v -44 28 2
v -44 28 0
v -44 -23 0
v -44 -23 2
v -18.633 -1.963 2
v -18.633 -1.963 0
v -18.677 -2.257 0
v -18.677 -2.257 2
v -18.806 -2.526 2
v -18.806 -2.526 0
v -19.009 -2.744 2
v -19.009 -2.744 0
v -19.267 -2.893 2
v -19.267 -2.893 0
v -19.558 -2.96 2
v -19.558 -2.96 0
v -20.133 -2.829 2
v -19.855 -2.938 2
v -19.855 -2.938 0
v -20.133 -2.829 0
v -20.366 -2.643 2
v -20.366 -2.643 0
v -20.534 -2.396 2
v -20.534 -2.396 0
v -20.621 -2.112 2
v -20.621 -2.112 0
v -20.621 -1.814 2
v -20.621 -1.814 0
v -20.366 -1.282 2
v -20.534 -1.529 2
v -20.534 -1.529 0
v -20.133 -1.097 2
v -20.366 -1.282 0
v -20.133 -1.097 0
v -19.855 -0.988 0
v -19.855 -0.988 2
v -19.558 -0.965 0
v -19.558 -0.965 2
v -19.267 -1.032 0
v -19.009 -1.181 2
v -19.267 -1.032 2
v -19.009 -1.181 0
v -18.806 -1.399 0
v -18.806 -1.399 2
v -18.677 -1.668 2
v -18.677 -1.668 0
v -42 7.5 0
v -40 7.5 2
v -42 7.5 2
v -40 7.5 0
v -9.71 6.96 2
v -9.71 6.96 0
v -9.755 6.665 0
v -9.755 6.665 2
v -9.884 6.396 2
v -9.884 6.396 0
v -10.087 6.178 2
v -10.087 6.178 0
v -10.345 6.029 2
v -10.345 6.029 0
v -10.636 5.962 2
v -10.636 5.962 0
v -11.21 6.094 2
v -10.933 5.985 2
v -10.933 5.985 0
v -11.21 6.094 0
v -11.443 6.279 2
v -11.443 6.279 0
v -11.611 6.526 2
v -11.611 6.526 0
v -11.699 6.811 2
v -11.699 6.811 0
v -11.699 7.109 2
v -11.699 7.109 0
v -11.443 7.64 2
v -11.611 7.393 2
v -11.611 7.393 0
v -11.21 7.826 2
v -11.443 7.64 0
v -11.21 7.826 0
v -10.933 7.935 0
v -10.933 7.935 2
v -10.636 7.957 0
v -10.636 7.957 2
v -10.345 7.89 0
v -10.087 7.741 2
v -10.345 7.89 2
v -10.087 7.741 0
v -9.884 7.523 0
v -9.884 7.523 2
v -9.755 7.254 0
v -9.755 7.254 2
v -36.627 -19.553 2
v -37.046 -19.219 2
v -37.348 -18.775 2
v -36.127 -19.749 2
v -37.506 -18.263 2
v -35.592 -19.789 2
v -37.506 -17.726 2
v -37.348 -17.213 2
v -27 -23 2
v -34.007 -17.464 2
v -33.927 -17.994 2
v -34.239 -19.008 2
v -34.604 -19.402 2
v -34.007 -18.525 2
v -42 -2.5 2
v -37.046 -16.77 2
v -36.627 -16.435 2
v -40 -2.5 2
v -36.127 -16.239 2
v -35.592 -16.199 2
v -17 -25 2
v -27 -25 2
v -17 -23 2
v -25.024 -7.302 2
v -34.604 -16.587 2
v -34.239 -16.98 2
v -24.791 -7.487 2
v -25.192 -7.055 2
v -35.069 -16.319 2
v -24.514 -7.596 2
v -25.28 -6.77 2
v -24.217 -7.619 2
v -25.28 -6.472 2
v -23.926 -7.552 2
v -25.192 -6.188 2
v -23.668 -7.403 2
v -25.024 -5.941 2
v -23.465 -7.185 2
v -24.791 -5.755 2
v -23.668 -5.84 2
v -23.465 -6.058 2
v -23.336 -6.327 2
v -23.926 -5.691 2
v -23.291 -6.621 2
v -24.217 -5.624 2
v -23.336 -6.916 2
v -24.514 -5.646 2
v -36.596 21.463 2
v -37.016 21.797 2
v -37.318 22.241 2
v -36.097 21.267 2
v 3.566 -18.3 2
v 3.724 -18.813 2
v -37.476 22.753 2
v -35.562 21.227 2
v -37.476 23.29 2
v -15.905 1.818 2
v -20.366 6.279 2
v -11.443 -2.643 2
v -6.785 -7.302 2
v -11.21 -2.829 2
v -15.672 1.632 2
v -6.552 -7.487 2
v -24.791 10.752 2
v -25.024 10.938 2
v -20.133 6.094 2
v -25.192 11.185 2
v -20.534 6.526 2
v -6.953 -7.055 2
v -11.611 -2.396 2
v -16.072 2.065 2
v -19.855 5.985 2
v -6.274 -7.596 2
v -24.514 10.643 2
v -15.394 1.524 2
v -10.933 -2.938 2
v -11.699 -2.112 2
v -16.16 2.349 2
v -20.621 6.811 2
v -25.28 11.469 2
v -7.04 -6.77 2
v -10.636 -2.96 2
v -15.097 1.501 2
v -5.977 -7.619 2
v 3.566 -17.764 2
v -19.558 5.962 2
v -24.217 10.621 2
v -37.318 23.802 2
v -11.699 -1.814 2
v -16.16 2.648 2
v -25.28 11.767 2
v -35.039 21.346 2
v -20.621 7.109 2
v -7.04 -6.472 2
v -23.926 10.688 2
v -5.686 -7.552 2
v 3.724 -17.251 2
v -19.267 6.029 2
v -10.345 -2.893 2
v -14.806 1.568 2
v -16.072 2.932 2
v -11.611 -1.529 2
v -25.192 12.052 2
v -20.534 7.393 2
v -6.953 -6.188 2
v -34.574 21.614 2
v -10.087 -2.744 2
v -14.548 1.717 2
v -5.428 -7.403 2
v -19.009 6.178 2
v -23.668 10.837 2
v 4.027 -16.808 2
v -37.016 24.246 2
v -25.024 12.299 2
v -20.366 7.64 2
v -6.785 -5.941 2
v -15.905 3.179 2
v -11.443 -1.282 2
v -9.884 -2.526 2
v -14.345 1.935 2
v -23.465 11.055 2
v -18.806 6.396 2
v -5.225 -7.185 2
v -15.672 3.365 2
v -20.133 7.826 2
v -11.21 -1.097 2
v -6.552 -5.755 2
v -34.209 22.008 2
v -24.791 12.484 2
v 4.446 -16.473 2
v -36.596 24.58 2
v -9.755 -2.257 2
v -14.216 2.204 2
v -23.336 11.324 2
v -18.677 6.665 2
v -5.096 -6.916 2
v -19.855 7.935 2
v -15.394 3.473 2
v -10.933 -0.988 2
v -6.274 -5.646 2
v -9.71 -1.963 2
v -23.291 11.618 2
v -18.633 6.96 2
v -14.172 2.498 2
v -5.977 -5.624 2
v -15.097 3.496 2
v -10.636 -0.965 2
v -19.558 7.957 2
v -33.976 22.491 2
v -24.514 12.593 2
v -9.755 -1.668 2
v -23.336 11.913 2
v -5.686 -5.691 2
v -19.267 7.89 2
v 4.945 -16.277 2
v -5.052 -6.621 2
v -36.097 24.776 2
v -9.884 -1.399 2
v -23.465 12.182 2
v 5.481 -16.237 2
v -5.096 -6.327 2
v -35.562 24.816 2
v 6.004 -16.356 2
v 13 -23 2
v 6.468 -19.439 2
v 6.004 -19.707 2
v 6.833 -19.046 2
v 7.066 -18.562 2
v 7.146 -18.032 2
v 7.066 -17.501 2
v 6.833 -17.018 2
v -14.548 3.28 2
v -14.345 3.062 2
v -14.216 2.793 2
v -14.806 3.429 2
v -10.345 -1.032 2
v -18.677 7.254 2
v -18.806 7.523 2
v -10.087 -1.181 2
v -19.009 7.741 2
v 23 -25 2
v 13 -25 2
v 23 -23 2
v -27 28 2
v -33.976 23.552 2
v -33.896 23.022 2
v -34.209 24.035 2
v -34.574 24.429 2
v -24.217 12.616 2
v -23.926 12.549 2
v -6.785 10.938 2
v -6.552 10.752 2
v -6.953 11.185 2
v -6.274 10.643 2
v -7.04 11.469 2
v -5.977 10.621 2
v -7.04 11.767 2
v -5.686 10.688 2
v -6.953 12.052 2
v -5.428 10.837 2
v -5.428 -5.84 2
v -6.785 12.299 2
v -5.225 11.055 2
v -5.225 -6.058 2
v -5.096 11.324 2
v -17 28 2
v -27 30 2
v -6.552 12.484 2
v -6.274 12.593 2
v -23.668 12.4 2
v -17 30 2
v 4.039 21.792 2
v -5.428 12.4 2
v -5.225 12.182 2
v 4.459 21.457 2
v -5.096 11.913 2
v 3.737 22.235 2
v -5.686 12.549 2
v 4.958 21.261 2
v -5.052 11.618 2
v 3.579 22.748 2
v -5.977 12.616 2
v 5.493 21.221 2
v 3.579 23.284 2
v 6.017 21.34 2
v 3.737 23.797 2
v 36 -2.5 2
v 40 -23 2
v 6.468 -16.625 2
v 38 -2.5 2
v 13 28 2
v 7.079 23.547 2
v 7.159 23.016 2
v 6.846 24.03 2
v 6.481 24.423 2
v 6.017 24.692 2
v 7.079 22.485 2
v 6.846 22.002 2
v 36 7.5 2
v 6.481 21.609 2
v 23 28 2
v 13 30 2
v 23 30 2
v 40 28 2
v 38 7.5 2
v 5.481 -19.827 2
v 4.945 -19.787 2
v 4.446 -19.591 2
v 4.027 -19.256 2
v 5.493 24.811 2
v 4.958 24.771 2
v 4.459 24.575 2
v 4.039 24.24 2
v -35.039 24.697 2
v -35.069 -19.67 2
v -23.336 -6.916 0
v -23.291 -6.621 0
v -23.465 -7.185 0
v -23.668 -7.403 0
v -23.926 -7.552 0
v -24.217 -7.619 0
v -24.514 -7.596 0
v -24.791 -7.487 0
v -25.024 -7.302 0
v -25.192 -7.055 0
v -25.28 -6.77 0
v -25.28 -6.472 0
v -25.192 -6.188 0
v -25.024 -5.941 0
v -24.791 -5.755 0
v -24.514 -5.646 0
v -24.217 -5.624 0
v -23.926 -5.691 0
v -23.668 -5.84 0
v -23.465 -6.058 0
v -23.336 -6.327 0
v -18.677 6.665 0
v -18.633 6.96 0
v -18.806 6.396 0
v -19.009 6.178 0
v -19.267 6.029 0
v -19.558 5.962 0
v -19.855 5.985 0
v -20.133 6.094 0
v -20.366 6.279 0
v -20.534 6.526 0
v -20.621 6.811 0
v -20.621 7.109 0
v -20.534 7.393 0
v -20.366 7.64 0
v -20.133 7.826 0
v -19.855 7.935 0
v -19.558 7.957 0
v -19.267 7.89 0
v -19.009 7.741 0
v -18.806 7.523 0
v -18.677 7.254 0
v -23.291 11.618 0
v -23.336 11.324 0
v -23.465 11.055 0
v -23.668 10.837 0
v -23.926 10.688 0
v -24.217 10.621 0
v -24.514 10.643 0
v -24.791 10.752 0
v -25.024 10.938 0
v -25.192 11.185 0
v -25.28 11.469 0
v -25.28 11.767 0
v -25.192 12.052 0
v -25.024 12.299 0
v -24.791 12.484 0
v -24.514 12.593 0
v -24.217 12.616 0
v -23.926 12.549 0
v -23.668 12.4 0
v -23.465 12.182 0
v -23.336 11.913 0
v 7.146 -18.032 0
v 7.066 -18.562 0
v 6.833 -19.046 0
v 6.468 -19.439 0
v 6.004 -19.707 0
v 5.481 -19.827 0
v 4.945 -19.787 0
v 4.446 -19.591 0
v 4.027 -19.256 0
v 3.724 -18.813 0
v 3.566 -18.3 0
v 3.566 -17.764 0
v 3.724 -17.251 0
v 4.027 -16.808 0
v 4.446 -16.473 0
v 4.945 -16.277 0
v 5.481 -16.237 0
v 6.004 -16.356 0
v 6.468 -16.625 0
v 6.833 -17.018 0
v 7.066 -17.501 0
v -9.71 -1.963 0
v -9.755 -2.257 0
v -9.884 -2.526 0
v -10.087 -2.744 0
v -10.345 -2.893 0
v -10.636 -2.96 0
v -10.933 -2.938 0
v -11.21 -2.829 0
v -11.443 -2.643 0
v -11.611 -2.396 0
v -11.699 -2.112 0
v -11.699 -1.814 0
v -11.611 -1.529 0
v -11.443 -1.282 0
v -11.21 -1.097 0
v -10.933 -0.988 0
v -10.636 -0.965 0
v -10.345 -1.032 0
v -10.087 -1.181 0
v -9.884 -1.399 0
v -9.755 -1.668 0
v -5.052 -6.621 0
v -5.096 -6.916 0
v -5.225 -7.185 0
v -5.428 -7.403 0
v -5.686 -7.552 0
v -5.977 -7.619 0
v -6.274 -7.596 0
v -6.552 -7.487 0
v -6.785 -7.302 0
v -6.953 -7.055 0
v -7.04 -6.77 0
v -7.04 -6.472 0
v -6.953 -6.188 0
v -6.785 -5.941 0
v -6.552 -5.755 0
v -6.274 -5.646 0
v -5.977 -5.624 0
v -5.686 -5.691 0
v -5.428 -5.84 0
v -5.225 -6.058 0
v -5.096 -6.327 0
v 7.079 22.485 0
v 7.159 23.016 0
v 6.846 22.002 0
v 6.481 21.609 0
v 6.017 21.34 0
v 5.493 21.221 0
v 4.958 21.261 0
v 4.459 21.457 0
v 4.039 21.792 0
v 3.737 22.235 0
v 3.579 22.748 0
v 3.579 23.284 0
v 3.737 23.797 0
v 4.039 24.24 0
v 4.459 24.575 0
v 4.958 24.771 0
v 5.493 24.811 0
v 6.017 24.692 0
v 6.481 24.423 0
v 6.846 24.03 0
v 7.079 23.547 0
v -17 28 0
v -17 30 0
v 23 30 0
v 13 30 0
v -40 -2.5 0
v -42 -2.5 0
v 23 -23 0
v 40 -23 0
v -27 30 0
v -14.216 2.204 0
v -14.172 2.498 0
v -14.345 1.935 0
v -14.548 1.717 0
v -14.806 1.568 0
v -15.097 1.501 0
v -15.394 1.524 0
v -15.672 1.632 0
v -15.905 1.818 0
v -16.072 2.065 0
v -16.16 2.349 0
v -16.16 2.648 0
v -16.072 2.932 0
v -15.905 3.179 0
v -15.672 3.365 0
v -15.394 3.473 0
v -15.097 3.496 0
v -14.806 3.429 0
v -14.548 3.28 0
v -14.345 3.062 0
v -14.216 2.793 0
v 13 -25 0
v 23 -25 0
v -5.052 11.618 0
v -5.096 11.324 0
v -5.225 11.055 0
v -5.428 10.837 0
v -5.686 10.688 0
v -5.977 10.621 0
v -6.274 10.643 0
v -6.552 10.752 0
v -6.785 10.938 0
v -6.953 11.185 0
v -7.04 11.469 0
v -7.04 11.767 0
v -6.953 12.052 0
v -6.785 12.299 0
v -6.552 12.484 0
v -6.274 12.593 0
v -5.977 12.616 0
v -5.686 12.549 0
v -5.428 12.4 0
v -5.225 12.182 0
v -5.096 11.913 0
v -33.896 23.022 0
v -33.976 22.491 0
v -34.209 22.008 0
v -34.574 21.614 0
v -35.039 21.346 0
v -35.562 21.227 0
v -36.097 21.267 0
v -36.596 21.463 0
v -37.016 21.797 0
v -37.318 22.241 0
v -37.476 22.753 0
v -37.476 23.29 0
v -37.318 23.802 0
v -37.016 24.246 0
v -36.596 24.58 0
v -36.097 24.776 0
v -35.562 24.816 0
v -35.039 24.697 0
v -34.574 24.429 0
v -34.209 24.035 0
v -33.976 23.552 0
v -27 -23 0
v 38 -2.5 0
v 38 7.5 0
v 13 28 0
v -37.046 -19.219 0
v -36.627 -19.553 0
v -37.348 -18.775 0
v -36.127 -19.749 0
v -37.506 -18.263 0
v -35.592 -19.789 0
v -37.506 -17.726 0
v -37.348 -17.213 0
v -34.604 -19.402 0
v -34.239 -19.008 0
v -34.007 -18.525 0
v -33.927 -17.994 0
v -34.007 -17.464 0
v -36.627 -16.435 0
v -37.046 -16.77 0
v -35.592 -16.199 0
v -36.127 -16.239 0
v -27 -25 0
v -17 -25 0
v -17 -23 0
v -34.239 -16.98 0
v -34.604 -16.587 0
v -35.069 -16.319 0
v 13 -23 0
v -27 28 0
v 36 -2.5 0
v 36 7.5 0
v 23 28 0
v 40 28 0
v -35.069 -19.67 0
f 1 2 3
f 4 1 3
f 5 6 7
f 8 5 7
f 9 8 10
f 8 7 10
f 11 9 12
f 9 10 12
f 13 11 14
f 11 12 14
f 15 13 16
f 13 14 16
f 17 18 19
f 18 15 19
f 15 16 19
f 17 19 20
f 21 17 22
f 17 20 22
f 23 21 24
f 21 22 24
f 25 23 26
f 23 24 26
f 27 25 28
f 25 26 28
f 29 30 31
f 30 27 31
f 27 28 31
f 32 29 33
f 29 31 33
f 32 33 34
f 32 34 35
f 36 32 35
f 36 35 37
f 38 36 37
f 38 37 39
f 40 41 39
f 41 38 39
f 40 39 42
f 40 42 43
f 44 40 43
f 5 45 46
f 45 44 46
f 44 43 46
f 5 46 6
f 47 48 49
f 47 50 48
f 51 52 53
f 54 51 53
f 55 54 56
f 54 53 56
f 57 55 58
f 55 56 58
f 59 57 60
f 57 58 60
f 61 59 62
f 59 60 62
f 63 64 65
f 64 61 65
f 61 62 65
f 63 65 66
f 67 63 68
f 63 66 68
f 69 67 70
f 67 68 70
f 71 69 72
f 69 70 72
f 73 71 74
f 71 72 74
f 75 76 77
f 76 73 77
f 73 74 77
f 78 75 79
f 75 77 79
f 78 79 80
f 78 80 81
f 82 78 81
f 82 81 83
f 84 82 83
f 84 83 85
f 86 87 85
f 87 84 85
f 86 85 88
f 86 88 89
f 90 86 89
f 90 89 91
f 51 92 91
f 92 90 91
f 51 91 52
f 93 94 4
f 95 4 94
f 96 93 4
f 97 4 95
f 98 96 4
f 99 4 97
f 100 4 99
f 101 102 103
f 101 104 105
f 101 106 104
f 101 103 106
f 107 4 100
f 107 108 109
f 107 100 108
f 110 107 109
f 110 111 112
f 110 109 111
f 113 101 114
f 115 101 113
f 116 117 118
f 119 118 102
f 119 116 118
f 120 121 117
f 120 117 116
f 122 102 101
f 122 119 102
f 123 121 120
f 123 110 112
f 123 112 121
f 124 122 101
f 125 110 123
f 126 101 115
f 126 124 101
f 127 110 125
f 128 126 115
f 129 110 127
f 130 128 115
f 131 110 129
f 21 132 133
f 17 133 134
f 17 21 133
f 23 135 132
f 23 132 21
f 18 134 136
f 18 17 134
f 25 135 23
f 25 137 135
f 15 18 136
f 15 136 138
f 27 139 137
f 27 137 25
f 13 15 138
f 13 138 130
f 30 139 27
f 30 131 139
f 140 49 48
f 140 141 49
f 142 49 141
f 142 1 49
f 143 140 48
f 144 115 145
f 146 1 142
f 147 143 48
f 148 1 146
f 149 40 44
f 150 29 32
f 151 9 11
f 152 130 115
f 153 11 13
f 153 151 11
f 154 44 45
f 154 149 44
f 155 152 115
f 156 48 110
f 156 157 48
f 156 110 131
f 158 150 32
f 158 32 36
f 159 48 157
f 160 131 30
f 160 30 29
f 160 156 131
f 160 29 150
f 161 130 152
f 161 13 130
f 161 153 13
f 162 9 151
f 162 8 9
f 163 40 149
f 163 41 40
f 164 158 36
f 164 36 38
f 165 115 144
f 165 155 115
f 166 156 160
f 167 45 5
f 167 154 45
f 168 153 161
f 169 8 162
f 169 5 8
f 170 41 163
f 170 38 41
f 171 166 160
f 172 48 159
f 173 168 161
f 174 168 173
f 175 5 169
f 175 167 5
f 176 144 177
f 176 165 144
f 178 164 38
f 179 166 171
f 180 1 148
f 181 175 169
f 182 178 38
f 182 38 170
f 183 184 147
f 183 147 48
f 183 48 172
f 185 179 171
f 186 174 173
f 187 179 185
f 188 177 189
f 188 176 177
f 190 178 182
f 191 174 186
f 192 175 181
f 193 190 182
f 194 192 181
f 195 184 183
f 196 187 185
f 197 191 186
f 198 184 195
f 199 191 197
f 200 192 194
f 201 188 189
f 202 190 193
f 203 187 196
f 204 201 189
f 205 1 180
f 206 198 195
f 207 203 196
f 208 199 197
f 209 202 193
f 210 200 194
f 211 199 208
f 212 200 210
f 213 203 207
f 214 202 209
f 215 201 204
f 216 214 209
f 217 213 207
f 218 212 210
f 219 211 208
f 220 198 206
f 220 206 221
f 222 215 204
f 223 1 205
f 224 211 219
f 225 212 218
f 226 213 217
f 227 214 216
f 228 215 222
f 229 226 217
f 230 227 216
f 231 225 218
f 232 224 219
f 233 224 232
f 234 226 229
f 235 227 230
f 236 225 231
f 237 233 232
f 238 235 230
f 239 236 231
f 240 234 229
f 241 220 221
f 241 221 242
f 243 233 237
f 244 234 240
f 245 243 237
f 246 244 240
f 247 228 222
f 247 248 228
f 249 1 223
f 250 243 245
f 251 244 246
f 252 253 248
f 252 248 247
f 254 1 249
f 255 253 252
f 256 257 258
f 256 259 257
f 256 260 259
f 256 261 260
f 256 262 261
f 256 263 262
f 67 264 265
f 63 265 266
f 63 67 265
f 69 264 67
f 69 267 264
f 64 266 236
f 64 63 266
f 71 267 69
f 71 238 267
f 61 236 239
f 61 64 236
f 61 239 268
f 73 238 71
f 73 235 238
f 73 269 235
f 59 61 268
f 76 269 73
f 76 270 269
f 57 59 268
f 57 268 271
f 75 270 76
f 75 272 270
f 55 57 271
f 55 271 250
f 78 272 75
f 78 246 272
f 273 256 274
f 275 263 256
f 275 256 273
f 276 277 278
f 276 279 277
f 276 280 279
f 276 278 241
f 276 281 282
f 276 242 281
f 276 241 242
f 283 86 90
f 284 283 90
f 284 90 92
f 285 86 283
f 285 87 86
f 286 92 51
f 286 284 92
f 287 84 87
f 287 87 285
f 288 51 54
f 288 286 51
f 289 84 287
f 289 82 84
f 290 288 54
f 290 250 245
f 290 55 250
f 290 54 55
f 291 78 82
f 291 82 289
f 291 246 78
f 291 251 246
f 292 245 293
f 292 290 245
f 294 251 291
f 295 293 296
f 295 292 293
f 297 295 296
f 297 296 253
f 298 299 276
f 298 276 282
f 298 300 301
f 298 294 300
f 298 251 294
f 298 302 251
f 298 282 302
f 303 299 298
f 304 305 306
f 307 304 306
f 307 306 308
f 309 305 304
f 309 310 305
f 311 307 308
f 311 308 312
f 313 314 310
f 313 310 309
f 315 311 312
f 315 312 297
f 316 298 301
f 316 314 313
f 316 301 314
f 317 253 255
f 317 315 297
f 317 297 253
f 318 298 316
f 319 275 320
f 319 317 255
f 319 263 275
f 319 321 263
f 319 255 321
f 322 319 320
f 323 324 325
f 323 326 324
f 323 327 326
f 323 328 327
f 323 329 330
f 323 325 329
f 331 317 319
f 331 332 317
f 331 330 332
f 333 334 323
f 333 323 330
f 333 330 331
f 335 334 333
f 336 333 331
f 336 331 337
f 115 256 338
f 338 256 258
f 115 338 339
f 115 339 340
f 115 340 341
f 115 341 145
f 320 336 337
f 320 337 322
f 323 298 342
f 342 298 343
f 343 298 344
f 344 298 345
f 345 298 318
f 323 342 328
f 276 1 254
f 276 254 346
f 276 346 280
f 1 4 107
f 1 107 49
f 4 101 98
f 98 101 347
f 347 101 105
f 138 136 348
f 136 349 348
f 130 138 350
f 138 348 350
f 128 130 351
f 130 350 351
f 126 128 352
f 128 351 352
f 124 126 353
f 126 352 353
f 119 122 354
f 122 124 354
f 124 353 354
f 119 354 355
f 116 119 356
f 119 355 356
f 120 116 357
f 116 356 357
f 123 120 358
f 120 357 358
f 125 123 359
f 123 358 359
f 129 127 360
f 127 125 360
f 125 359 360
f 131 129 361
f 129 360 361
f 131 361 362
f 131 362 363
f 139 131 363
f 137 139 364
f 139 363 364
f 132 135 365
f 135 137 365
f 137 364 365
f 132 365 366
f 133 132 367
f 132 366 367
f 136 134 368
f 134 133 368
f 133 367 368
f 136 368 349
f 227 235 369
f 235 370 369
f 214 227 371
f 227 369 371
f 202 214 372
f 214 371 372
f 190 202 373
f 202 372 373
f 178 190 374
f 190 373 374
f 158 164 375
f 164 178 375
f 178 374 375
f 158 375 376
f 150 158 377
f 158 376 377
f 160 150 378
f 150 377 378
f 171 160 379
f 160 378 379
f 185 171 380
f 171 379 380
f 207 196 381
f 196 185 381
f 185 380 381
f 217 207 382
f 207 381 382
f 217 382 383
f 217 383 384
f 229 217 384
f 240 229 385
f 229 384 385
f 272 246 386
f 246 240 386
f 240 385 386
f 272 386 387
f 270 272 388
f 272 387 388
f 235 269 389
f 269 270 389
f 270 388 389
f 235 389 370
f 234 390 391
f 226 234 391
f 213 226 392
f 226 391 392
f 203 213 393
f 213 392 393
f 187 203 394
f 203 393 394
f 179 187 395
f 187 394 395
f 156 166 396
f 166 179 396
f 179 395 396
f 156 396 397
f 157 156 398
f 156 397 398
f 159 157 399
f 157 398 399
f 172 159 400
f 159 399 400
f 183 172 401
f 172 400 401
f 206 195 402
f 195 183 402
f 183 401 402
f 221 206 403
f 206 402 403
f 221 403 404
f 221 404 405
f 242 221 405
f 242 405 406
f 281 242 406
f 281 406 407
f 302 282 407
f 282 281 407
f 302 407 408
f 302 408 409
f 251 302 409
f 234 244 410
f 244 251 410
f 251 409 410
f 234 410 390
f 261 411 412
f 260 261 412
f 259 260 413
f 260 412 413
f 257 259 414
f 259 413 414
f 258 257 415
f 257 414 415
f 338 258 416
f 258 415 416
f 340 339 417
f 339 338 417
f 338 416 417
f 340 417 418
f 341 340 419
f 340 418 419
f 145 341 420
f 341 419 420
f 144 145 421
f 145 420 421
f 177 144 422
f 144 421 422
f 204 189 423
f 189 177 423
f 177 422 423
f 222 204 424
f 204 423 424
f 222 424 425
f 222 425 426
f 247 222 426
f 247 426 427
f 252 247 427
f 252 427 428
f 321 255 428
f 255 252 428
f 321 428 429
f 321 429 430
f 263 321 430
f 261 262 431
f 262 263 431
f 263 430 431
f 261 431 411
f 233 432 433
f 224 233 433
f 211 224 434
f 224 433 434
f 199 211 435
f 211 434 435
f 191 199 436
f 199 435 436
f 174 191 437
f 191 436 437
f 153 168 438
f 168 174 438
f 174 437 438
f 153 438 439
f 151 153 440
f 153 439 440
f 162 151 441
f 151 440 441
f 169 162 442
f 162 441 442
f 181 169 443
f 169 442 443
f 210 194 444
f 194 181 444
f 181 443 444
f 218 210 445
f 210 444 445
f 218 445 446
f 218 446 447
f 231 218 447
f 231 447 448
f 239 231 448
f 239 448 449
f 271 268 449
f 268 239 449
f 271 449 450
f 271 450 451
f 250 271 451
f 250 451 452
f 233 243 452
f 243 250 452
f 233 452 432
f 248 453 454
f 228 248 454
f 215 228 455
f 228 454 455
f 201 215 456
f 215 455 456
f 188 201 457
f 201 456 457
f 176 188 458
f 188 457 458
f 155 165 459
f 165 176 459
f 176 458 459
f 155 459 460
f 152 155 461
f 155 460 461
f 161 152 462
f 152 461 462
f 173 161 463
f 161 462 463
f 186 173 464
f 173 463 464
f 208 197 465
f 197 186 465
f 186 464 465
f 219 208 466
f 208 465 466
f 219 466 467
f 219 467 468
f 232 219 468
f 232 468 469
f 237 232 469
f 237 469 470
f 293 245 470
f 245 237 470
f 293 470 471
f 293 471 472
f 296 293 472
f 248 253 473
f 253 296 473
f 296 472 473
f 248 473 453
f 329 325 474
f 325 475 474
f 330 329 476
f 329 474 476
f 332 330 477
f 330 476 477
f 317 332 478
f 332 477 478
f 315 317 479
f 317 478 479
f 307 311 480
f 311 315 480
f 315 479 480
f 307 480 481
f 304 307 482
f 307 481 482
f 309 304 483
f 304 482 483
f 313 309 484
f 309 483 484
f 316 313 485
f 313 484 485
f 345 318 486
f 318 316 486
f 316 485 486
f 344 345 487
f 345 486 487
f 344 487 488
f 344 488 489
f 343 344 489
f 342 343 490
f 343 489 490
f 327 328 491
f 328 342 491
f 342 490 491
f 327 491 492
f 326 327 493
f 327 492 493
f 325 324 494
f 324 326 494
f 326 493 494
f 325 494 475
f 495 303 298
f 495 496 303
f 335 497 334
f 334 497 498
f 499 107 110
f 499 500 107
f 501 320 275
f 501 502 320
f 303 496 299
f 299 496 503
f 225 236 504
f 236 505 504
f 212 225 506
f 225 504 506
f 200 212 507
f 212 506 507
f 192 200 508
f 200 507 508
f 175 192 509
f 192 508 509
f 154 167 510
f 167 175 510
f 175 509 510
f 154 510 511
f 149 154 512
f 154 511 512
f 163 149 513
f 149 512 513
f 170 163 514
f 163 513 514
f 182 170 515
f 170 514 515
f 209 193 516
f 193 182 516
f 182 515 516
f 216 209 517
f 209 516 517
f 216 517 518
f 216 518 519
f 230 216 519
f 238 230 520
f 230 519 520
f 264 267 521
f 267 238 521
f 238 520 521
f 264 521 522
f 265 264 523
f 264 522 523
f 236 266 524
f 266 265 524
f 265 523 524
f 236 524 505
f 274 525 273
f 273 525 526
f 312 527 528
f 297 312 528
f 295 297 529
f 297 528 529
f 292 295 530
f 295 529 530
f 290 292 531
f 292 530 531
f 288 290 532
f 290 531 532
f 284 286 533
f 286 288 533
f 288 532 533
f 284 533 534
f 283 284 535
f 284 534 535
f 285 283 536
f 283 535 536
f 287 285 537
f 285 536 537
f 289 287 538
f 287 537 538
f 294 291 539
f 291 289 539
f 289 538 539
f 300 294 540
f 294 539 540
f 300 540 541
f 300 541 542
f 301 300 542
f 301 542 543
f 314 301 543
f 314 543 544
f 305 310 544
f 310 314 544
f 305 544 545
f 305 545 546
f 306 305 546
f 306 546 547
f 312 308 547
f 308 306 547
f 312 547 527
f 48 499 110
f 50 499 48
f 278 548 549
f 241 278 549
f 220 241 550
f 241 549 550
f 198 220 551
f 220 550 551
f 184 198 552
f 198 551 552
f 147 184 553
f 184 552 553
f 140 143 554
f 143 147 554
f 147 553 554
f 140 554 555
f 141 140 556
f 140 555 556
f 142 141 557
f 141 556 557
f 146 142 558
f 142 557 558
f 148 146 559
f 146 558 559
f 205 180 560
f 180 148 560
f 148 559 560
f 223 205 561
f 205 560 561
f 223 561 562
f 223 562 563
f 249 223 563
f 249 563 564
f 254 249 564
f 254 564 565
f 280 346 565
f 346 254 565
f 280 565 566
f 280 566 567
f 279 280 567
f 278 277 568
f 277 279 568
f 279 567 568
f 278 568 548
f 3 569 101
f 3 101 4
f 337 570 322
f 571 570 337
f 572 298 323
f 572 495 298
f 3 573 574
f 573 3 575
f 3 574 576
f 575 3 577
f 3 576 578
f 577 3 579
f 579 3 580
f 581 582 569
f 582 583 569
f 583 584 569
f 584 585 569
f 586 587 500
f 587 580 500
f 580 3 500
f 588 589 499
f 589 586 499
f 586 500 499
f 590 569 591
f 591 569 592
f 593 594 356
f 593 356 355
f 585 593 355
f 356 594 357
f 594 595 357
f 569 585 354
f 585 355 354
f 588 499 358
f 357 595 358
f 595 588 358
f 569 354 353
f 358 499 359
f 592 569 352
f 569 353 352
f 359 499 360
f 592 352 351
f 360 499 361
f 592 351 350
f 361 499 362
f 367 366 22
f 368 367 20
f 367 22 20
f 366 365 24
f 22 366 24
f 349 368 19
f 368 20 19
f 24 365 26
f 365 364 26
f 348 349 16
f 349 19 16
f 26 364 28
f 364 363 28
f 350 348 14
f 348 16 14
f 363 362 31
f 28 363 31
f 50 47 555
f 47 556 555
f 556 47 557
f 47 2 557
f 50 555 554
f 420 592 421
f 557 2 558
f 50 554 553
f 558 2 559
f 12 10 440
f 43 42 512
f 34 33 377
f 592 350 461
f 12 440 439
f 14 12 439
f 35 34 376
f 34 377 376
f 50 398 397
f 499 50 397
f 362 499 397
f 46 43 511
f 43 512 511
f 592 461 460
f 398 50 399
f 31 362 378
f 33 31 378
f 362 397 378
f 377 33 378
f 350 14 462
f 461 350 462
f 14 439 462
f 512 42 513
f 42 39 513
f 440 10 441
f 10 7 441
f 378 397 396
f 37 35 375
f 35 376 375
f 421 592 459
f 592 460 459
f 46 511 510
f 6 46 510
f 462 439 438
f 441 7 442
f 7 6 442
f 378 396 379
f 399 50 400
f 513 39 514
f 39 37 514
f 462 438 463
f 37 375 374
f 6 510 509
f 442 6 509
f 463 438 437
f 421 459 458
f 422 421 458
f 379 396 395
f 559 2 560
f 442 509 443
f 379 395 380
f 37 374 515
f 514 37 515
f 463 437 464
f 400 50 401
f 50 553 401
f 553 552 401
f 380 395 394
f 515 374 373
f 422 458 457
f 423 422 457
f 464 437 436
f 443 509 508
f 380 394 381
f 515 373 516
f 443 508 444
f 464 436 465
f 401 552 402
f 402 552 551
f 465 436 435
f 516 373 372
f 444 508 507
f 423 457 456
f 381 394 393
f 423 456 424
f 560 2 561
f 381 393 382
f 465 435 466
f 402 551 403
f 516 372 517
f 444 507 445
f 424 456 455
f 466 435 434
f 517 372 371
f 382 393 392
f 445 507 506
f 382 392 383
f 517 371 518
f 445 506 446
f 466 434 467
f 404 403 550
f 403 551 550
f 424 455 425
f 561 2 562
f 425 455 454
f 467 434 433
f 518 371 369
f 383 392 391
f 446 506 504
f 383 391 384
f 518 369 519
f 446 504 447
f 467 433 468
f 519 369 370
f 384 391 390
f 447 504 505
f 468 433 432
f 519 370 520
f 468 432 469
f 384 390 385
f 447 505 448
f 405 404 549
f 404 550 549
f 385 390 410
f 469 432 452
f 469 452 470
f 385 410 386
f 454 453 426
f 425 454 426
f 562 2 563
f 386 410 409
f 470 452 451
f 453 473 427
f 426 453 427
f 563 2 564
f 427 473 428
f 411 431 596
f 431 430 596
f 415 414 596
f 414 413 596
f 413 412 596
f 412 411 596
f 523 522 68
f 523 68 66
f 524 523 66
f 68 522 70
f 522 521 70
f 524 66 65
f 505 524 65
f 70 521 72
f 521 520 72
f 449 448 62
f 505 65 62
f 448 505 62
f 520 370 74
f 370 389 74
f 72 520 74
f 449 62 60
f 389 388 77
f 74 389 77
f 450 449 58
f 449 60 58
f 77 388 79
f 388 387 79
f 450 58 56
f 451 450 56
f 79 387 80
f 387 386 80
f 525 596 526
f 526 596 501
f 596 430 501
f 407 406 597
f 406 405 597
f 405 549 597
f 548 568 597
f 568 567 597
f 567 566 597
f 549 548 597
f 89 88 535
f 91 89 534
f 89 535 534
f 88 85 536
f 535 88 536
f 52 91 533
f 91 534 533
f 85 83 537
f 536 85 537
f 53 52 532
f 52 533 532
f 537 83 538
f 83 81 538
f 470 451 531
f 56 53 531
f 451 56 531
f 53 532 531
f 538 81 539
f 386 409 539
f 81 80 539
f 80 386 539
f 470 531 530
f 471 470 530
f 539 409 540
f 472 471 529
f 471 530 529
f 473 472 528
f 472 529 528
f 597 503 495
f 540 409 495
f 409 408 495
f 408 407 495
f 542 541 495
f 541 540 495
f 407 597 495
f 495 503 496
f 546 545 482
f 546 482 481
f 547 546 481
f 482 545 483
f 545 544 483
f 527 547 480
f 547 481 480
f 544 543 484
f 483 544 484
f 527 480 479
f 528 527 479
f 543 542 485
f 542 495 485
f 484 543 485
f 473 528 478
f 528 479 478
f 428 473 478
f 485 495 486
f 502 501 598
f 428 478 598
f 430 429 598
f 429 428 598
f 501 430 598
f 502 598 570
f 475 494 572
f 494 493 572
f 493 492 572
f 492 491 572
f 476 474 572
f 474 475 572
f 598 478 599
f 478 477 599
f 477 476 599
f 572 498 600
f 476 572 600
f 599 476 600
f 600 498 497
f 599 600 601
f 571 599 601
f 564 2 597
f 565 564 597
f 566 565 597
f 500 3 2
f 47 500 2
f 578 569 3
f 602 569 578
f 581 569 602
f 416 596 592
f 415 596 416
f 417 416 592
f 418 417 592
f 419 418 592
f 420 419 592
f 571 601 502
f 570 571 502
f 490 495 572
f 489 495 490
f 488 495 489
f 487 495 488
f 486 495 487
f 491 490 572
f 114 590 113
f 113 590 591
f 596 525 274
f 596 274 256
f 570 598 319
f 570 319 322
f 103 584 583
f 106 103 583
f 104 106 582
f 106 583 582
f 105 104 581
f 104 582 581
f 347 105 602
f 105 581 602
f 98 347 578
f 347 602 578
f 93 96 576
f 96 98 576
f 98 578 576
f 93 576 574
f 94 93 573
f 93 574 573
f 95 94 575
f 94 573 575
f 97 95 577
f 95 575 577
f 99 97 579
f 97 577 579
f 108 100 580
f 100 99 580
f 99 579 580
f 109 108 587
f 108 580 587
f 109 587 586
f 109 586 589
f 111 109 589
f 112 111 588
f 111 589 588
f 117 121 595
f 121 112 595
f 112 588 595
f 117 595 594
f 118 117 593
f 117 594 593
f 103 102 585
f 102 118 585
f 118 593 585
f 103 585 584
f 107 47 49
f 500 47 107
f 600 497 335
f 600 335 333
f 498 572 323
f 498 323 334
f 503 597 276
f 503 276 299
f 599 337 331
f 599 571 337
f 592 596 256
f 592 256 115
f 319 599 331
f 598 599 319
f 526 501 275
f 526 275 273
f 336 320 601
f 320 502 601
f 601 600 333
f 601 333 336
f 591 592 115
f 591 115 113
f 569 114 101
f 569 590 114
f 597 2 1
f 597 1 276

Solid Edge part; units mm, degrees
sketch "Sketch1" plane through (0, 0, 0) normal (0, 0, 1) x (1, 0, 0)
  line L0 (40, -25) -> (40, 30)
  line L1 (40, 30) -> (-44, 30)
  line L2 (-44, 30) -> (-44, -25)
  line L3 (-44, -25) -> (40, -25)
extrude "Protrusion1" add sketch "Sketch1" along normal blind 2
sketch "Sketch2" plane through (0, 0, 0) normal (0, 0, 1) x (1, 0, 0)
  line L0 (-44, 28) -> (-27, 28)
  line L1 (-27, 28) -> (-27, 30)
  line L2 (-27, 30) -> (-44, 30)
  line L3 (-44, 30) -> (-44, 28)
extrude "ExtrudedCutout_1" cut sketch "Sketch2" along normal blind 2
sketch "Sketch3" plane through (0, 0, 0) normal (0, 0, 1) x (1, 0, 0)
  line L0 (-17, 28) -> (13, 28)
  line L1 (13, 28) -> (13, 30)
  line L2 (13, 30) -> (-17, 30)
  line L3 (-17, 30) -> (-17, 28)
extrude "ExtrudedCutout_2" cut sketch "Sketch3" along normal blind 2
sketch "Sketch4" plane through (0, 0, 0) normal (0, 0, 1) x (1, 0, 0)
  line L0 (23, 28) -> (40, 28)
  line L1 (40, 28) -> (40, 30)
  line L2 (40, 30) -> (23, 30)
  line L3 (23, 30) -> (23, 28)
extrude "ExtrudedCutout_3" cut sketch "Sketch4" along normal blind 2
sketch "Sketch5" plane through (0, 0, 0) normal (0, 0, 1) x (1, 0, 0)
  line L0 (38, -2.5) -> (38, 7.5)
  line L1 (38, 7.5) -> (36, 7.5)
  line L2 (36, 7.5) -> (36, -2.5)
  line L3 (36, -2.5) -> (38, -2.5)
extrude "ExtrudedCutout_4" cut sketch "Sketch5" along normal blind 2
sketch "Sketch6" plane through (0, 0, 0) normal (0, 0, 1) x (1, 0, 0)
  line L0 (40, -23) -> (23, -23)
  line L1 (23, -23) -> (23, -25)
  line L2 (23, -25) -> (40, -25)
  line L3 (40, -25) -> (40, -23)
extrude "ExtrudedCutout_5" cut sketch "Sketch6" along normal blind 2
sketch "Sketch7" plane through (0, 0, 0) normal (0, 0, 1) x (1, 0, 0)
  line L0 (13, -23) -> (-17, -23)
  line L1 (-17, -23) -> (-17, -25)
  line L2 (-17, -25) -> (13, -25)
  line L3 (13, -25) -> (13, -23)
extrude "ExtrudedCutout_6" cut sketch "Sketch7" along normal blind 2
sketch "Sketch8" plane through (0, 0, 0) normal (0, 0, 1) x (1, 0, 0)
  line L0 (-27, -23) -> (-44, -23)
  line L1 (-44, -23) -> (-44, -25)
  line L2 (-44, -25) -> (-27, -25)
  line L3 (-27, -25) -> (-27, -23)
extrude "ExtrudedCutout_7" cut sketch "Sketch8" along normal blind 2
sketch "Sketch9" plane through (0, 0, 0) normal (0, 0, 1) x (1, 0, 0)
  line L0 (-40, -2.5) -> (-40, 7.5)
  line L1 (-40, 7.5) -> (-42, 7.5)
  line L2 (-42, 7.5) -> (-42, -2.5)
  line L3 (-42, -2.5) -> (-40, -2.5)
extrude "ExtrudedCutout_8" cut sketch "Sketch9" along normal blind 2
sketch "Sketch10" plane through (0, 0, 0) normal (0, 0, 1) x (1, 0, 0)
  circle A0 centre (-35.6965, 23.0215) radius 1.8
extrude "Cutout1" cut sketch "Sketch10" along normal blind 2
sketch "Sketch11" plane through (0, 0, 0) normal (0, 0, 1) x (1, 0, 0)
  circle A0 centre (5.3589, 23.016) radius 1.8
extrude "ExtrudedCutout_10" cut sketch "Sketch11" along normal blind 2
sketch "Sketch12" plane through (0, 0, 0) normal (0, 0, 1) x (1, 0, 0)
  circle A0 centre (-35.7266, -17.9943) radius 1.8
extrude "ExtrudedCutout_11" cut sketch "Sketch12" along normal blind 2
sketch "Sketch13" plane through (0, 0, 0) normal (0, 0, 1) x (1, 0, 0)
  circle A0 centre (5.346, -18.0319) radius 1.8
extrude "ExtrudedCutout_12" cut sketch "Sketch13" along normal blind 2
sketch "Sketch14" plane through (0, 0, 0) normal (0, 0, 1) x (1, 0, 0)
  circle A0 centre (-24.2914, 11.6184) radius 1
  circle A1 centre (-19.6326, 6.9596) radius 1
  circle A2 centre (-15.1715, 2.4985) radius 1
  circle A3 centre (-10.7104, 6.9596) radius 1
  circle A4 centre (-6.0516, 11.6184) radius 1
  circle A5 centre (-10.7104, -1.9626) radius 1
  circle A6 centre (-6.0516, -6.6214) radius 1
  circle A7 centre (-19.6326, -1.9626) radius 1
  circle A8 centre (-24.2914, -6.6214) radius 1
  dimension "D1" = 2
  dimension "D2" = 2
  dimension "D3" = 2
  dimension "D4" = 2
  dimension "D5" = 2
  dimension "D6" = 2
  dimension "D7" = 2
  dimension "D8" = 2
  dimension "D9" = 2
extrude "ExtrudedCutout_13" cut sketch "Sketch14" along normal blind 2
properties material "Acrylic, high impact grade"
